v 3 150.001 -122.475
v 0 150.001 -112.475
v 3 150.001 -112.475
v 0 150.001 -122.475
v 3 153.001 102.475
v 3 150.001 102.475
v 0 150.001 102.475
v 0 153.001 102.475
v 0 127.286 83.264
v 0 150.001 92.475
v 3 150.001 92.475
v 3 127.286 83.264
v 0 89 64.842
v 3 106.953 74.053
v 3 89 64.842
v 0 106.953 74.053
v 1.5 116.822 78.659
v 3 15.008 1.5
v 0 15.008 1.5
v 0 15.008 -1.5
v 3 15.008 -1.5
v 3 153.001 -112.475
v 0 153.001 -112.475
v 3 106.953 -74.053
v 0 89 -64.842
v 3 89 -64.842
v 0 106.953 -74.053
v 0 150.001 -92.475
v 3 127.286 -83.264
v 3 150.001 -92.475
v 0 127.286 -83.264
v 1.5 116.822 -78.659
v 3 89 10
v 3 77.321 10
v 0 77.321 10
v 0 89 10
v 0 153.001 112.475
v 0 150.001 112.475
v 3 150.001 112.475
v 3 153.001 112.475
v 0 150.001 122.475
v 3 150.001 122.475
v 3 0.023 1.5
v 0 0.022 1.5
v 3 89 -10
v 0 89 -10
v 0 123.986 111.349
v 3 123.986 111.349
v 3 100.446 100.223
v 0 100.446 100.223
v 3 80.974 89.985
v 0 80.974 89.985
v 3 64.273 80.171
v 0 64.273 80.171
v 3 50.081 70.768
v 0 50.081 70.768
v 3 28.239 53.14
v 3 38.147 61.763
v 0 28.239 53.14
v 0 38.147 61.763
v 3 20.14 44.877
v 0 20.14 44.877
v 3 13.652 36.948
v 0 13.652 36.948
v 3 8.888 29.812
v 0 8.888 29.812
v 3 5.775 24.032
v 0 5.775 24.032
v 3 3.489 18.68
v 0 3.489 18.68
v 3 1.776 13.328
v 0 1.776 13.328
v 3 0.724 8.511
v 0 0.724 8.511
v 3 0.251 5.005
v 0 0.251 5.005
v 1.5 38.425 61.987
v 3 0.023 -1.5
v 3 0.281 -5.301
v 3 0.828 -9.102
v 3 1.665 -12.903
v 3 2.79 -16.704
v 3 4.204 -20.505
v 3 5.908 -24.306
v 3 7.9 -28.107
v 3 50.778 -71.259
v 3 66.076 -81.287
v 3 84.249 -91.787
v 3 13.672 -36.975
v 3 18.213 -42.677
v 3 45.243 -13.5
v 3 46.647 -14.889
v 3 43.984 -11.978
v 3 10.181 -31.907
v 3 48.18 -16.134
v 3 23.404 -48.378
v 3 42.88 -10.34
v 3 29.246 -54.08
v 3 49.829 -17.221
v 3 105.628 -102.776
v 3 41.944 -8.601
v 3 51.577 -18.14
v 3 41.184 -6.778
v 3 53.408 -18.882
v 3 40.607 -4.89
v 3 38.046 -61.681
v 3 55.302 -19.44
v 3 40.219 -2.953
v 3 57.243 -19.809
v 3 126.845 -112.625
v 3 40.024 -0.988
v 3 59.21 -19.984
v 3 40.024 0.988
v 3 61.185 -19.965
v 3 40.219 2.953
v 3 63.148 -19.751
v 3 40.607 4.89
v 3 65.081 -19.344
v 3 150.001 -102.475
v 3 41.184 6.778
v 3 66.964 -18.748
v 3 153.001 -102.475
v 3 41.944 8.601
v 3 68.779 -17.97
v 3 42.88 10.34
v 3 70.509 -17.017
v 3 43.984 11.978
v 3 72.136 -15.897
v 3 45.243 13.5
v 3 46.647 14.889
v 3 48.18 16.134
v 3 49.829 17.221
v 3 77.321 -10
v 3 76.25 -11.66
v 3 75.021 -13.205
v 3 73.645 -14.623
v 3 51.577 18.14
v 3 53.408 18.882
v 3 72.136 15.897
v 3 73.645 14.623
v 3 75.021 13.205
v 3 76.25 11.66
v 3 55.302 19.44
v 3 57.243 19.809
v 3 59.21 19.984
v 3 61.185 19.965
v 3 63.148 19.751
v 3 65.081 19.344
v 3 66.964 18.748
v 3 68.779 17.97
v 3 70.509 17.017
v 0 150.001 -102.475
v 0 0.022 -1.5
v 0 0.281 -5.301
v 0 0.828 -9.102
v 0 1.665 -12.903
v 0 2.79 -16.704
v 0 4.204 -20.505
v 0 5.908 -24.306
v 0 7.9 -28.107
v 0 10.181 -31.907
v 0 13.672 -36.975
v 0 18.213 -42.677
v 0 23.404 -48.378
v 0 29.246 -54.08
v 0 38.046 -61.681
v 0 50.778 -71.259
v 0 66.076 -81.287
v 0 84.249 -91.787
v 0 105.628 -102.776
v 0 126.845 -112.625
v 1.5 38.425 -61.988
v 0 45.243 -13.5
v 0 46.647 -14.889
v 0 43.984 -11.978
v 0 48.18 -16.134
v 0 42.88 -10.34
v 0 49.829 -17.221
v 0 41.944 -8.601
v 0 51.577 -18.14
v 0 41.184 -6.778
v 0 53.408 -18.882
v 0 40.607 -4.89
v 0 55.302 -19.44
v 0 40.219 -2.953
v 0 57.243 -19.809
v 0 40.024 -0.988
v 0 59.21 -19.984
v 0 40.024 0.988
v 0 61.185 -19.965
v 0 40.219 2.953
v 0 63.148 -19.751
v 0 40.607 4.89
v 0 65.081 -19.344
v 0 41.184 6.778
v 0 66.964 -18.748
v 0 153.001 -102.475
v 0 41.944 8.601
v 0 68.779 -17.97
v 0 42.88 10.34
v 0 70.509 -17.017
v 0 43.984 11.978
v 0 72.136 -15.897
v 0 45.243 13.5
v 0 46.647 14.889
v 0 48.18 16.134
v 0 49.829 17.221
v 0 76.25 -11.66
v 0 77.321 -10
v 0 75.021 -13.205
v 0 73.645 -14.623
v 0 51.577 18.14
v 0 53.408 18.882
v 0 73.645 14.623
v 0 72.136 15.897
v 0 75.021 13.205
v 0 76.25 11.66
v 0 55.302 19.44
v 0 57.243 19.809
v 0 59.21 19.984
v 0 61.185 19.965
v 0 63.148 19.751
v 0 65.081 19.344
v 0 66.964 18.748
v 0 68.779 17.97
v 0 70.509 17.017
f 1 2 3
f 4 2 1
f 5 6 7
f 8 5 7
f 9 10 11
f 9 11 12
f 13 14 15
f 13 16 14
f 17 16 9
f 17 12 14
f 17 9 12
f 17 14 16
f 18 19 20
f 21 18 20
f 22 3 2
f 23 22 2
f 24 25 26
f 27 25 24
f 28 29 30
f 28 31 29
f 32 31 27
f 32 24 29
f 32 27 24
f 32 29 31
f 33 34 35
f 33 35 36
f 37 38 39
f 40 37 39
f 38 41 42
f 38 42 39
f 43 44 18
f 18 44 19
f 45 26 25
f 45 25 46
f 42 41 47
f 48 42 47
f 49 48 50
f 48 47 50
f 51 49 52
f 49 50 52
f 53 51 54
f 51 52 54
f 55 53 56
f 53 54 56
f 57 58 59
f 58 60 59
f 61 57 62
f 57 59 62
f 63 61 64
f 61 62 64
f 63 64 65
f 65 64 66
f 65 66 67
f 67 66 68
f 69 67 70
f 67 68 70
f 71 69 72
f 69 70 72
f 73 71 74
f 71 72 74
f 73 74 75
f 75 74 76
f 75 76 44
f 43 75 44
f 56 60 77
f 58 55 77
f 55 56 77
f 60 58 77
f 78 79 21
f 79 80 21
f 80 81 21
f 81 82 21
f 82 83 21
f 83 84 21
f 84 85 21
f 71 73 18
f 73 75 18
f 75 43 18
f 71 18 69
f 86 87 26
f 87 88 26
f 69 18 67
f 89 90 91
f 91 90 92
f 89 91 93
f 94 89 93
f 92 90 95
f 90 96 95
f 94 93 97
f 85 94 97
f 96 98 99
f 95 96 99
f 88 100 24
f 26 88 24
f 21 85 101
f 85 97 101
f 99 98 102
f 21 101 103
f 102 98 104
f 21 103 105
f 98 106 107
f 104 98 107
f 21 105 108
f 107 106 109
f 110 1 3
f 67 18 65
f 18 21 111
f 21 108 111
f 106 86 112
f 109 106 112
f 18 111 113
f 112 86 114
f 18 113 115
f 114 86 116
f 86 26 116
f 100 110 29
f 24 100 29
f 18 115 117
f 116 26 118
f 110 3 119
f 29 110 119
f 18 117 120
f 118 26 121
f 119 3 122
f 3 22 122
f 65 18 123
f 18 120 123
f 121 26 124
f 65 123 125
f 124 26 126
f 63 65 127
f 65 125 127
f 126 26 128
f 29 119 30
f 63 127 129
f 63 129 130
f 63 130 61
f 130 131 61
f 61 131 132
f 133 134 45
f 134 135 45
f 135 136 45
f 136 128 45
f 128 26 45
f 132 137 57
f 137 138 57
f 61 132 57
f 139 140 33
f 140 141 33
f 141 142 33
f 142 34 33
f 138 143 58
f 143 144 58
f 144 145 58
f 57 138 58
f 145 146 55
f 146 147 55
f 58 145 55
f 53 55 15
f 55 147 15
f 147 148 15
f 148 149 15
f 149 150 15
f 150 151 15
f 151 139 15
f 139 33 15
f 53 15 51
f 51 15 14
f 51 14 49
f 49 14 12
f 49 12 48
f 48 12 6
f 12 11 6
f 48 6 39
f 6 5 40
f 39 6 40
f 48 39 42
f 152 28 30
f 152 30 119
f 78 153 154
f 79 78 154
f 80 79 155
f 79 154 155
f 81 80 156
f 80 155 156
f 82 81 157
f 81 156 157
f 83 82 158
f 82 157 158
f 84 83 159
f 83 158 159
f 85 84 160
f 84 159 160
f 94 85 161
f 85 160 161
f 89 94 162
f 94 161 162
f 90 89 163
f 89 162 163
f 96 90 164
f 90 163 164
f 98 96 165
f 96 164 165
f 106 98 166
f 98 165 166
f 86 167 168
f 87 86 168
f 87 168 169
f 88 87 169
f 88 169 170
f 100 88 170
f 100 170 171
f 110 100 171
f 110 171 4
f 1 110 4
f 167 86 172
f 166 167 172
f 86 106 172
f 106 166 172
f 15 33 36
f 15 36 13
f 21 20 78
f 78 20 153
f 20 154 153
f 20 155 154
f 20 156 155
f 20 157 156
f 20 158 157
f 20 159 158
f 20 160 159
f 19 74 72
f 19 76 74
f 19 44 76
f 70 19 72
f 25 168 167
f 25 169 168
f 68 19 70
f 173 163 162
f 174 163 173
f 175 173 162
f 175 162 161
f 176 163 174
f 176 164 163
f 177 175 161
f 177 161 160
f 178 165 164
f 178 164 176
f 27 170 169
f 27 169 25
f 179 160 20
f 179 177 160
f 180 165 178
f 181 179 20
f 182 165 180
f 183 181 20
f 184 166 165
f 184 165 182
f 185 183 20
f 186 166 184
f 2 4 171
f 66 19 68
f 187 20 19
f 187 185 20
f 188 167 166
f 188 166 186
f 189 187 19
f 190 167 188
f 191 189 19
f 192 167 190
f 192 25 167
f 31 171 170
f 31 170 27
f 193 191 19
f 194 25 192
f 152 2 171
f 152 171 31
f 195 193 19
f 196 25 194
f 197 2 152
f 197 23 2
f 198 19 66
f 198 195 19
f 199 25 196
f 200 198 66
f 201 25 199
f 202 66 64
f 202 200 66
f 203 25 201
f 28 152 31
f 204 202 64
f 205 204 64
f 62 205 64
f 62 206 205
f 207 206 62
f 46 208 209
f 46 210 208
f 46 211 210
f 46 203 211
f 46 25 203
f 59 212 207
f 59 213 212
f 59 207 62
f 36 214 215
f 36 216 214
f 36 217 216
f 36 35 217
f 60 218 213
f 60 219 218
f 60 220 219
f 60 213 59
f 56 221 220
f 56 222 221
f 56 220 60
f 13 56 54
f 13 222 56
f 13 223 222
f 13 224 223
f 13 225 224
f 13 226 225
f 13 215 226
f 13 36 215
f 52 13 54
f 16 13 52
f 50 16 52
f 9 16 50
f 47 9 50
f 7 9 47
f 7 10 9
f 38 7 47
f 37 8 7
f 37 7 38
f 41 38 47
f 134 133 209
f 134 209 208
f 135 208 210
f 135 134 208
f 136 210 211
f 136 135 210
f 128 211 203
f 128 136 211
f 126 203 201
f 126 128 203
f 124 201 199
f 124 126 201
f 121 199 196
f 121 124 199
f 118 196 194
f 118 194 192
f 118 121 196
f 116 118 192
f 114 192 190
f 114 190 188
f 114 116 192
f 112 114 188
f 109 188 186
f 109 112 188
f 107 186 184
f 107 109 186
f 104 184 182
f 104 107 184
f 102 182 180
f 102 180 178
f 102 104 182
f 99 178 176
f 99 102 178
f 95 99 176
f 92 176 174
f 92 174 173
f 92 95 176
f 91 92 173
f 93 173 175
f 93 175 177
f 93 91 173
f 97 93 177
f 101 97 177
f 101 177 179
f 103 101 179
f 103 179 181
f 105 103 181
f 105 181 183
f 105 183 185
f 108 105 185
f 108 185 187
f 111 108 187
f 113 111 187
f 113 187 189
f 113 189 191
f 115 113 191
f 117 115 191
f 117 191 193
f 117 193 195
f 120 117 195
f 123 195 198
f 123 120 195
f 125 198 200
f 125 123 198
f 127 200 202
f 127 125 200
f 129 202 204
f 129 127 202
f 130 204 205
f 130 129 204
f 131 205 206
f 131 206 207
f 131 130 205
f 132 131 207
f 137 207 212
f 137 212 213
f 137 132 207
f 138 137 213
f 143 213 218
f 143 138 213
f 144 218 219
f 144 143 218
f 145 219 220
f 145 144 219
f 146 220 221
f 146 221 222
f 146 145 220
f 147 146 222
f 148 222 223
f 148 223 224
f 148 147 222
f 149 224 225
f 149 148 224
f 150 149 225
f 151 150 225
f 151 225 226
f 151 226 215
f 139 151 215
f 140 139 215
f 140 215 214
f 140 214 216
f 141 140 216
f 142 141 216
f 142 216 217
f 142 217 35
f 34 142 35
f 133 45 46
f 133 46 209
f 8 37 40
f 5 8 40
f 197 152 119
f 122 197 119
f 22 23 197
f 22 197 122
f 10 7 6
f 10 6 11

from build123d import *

# Parameters (mm, degrees)
EXTRUDE_1_DEPTH     = 3
EXTRUDE_2_DEPTH     = 3
EXTRUDE_3_DEPTH     = 3
CUT_EXTRUDE_1_DEPTH = 197.006403199


with BuildPart() as part:
    # 草图1 → 凸台-拉伸1 (new body)
    with BuildSketch(Plane(origin=(0, 0, 0), x_dir=(0, 0, -1), z_dir=(1, 0, 0))):
        with BuildLine():
            Line((-122.475, 150.001256251), (-92.475483103, 150.001256251))
            add(Edge.make_bspline(
                [(-92.475483103, 150.001256251), (0, -90.001256251), (92.475483103, 150.001256251)],
                knots=[0.160021058, 0.160021058, 0.160021058, 0.839978942, 0.839978942, 0.839978942], degree=2))
            Line((92.475483103, 150.001256251), (122.475, 150.001256251))
            add(Edge.make_bspline(
                [(-122.475, 150.001256251), (0, -150.001256251), (122.475, 150.001256251)],
                knots=[0.053283855, 0.053283855, 0.053283855, 0.946716145, 0.946716145, 0.946716145], degree=2))
        make_face()
    extrude(amount=EXTRUDE_1_DEPTH)

    # 草图3 → 凸台-拉伸2 (add)
    with BuildSketch(Plane(origin=(0, 150.001256251, 0), x_dir=(1, 0, 0), z_dir=(0, 1, 0))):
        Polygon((3, -102.475241552), (0.999991948, -102.475241552), (2.000008052, -112.475241552), (3, -112.475241552), align=None)
        Polygon((2.000008052, -112.475241552), (0.999991948, -102.475241552), (0, -102.475241552), (0, -112.475241552), align=None)
        Polygon((0.999991948, 102.475241552), (2.000008052, 112.475241552), (0, 112.475241552), (0, 102.475241552), align=None)
        Polygon((3, 112.475241552), (2.000008052, 112.475241552), (0.999991948, 102.475241552), (3, 102.475241552), align=None)
    extrude(amount=EXTRUDE_2_DEPTH)

    # 草图4 → 凸台-拉伸3 (add)
    with BuildSketch(Plane(origin=(3, 0, 0), x_dir=(0, 0, -1), z_dir=(1, 0, 0))):
        with BuildLine():
            Line((-10, 89), (-64.842495169, 89))
            add(Edge.make_bspline(
                [(64.842495169, 89), (0, -29), (-64.842495169, 89)],
                knots=[0, 0, 0, 1, 1, 1], degree=2))
            Line((64.842495169, 89), (10, 89))
            Line((10, 89), (10, 77.320508076))
            ThreePointArc((10, 77.320508076), (0, 40), (-10, 77.320508076))
            Line((-10, 77.320508076), (-10, 89))
        make_face()
    extrude(amount=-EXTRUDE_3_DEPTH)

    # 草图5 → 切除-拉伸1 (cut, through all)
    with BuildSketch(Plane.ZY):
        with BuildLine():
            Line((1.5, 15.007793411), (-1.5, 15.007793411))
            Line((-1.5, 15.007793411), (-1.5, 0.0225))
            add(Edge.make_bspline(
                [(-1.5, 0.0225), (0, -0.0225), (1.5, 0.0225)],
                knots=[0.49452889, 0.49452889, 0.49452889, 0.50547111, 0.50547111, 0.50547111], degree=2))
            Line((1.5, 0.0225), (1.5, 15.007793411))
        make_face()
    extrude(amount=-CUT_EXTRUDE_1_DEPTH, mode=Mode.SUBTRACT)


solid = part.part
